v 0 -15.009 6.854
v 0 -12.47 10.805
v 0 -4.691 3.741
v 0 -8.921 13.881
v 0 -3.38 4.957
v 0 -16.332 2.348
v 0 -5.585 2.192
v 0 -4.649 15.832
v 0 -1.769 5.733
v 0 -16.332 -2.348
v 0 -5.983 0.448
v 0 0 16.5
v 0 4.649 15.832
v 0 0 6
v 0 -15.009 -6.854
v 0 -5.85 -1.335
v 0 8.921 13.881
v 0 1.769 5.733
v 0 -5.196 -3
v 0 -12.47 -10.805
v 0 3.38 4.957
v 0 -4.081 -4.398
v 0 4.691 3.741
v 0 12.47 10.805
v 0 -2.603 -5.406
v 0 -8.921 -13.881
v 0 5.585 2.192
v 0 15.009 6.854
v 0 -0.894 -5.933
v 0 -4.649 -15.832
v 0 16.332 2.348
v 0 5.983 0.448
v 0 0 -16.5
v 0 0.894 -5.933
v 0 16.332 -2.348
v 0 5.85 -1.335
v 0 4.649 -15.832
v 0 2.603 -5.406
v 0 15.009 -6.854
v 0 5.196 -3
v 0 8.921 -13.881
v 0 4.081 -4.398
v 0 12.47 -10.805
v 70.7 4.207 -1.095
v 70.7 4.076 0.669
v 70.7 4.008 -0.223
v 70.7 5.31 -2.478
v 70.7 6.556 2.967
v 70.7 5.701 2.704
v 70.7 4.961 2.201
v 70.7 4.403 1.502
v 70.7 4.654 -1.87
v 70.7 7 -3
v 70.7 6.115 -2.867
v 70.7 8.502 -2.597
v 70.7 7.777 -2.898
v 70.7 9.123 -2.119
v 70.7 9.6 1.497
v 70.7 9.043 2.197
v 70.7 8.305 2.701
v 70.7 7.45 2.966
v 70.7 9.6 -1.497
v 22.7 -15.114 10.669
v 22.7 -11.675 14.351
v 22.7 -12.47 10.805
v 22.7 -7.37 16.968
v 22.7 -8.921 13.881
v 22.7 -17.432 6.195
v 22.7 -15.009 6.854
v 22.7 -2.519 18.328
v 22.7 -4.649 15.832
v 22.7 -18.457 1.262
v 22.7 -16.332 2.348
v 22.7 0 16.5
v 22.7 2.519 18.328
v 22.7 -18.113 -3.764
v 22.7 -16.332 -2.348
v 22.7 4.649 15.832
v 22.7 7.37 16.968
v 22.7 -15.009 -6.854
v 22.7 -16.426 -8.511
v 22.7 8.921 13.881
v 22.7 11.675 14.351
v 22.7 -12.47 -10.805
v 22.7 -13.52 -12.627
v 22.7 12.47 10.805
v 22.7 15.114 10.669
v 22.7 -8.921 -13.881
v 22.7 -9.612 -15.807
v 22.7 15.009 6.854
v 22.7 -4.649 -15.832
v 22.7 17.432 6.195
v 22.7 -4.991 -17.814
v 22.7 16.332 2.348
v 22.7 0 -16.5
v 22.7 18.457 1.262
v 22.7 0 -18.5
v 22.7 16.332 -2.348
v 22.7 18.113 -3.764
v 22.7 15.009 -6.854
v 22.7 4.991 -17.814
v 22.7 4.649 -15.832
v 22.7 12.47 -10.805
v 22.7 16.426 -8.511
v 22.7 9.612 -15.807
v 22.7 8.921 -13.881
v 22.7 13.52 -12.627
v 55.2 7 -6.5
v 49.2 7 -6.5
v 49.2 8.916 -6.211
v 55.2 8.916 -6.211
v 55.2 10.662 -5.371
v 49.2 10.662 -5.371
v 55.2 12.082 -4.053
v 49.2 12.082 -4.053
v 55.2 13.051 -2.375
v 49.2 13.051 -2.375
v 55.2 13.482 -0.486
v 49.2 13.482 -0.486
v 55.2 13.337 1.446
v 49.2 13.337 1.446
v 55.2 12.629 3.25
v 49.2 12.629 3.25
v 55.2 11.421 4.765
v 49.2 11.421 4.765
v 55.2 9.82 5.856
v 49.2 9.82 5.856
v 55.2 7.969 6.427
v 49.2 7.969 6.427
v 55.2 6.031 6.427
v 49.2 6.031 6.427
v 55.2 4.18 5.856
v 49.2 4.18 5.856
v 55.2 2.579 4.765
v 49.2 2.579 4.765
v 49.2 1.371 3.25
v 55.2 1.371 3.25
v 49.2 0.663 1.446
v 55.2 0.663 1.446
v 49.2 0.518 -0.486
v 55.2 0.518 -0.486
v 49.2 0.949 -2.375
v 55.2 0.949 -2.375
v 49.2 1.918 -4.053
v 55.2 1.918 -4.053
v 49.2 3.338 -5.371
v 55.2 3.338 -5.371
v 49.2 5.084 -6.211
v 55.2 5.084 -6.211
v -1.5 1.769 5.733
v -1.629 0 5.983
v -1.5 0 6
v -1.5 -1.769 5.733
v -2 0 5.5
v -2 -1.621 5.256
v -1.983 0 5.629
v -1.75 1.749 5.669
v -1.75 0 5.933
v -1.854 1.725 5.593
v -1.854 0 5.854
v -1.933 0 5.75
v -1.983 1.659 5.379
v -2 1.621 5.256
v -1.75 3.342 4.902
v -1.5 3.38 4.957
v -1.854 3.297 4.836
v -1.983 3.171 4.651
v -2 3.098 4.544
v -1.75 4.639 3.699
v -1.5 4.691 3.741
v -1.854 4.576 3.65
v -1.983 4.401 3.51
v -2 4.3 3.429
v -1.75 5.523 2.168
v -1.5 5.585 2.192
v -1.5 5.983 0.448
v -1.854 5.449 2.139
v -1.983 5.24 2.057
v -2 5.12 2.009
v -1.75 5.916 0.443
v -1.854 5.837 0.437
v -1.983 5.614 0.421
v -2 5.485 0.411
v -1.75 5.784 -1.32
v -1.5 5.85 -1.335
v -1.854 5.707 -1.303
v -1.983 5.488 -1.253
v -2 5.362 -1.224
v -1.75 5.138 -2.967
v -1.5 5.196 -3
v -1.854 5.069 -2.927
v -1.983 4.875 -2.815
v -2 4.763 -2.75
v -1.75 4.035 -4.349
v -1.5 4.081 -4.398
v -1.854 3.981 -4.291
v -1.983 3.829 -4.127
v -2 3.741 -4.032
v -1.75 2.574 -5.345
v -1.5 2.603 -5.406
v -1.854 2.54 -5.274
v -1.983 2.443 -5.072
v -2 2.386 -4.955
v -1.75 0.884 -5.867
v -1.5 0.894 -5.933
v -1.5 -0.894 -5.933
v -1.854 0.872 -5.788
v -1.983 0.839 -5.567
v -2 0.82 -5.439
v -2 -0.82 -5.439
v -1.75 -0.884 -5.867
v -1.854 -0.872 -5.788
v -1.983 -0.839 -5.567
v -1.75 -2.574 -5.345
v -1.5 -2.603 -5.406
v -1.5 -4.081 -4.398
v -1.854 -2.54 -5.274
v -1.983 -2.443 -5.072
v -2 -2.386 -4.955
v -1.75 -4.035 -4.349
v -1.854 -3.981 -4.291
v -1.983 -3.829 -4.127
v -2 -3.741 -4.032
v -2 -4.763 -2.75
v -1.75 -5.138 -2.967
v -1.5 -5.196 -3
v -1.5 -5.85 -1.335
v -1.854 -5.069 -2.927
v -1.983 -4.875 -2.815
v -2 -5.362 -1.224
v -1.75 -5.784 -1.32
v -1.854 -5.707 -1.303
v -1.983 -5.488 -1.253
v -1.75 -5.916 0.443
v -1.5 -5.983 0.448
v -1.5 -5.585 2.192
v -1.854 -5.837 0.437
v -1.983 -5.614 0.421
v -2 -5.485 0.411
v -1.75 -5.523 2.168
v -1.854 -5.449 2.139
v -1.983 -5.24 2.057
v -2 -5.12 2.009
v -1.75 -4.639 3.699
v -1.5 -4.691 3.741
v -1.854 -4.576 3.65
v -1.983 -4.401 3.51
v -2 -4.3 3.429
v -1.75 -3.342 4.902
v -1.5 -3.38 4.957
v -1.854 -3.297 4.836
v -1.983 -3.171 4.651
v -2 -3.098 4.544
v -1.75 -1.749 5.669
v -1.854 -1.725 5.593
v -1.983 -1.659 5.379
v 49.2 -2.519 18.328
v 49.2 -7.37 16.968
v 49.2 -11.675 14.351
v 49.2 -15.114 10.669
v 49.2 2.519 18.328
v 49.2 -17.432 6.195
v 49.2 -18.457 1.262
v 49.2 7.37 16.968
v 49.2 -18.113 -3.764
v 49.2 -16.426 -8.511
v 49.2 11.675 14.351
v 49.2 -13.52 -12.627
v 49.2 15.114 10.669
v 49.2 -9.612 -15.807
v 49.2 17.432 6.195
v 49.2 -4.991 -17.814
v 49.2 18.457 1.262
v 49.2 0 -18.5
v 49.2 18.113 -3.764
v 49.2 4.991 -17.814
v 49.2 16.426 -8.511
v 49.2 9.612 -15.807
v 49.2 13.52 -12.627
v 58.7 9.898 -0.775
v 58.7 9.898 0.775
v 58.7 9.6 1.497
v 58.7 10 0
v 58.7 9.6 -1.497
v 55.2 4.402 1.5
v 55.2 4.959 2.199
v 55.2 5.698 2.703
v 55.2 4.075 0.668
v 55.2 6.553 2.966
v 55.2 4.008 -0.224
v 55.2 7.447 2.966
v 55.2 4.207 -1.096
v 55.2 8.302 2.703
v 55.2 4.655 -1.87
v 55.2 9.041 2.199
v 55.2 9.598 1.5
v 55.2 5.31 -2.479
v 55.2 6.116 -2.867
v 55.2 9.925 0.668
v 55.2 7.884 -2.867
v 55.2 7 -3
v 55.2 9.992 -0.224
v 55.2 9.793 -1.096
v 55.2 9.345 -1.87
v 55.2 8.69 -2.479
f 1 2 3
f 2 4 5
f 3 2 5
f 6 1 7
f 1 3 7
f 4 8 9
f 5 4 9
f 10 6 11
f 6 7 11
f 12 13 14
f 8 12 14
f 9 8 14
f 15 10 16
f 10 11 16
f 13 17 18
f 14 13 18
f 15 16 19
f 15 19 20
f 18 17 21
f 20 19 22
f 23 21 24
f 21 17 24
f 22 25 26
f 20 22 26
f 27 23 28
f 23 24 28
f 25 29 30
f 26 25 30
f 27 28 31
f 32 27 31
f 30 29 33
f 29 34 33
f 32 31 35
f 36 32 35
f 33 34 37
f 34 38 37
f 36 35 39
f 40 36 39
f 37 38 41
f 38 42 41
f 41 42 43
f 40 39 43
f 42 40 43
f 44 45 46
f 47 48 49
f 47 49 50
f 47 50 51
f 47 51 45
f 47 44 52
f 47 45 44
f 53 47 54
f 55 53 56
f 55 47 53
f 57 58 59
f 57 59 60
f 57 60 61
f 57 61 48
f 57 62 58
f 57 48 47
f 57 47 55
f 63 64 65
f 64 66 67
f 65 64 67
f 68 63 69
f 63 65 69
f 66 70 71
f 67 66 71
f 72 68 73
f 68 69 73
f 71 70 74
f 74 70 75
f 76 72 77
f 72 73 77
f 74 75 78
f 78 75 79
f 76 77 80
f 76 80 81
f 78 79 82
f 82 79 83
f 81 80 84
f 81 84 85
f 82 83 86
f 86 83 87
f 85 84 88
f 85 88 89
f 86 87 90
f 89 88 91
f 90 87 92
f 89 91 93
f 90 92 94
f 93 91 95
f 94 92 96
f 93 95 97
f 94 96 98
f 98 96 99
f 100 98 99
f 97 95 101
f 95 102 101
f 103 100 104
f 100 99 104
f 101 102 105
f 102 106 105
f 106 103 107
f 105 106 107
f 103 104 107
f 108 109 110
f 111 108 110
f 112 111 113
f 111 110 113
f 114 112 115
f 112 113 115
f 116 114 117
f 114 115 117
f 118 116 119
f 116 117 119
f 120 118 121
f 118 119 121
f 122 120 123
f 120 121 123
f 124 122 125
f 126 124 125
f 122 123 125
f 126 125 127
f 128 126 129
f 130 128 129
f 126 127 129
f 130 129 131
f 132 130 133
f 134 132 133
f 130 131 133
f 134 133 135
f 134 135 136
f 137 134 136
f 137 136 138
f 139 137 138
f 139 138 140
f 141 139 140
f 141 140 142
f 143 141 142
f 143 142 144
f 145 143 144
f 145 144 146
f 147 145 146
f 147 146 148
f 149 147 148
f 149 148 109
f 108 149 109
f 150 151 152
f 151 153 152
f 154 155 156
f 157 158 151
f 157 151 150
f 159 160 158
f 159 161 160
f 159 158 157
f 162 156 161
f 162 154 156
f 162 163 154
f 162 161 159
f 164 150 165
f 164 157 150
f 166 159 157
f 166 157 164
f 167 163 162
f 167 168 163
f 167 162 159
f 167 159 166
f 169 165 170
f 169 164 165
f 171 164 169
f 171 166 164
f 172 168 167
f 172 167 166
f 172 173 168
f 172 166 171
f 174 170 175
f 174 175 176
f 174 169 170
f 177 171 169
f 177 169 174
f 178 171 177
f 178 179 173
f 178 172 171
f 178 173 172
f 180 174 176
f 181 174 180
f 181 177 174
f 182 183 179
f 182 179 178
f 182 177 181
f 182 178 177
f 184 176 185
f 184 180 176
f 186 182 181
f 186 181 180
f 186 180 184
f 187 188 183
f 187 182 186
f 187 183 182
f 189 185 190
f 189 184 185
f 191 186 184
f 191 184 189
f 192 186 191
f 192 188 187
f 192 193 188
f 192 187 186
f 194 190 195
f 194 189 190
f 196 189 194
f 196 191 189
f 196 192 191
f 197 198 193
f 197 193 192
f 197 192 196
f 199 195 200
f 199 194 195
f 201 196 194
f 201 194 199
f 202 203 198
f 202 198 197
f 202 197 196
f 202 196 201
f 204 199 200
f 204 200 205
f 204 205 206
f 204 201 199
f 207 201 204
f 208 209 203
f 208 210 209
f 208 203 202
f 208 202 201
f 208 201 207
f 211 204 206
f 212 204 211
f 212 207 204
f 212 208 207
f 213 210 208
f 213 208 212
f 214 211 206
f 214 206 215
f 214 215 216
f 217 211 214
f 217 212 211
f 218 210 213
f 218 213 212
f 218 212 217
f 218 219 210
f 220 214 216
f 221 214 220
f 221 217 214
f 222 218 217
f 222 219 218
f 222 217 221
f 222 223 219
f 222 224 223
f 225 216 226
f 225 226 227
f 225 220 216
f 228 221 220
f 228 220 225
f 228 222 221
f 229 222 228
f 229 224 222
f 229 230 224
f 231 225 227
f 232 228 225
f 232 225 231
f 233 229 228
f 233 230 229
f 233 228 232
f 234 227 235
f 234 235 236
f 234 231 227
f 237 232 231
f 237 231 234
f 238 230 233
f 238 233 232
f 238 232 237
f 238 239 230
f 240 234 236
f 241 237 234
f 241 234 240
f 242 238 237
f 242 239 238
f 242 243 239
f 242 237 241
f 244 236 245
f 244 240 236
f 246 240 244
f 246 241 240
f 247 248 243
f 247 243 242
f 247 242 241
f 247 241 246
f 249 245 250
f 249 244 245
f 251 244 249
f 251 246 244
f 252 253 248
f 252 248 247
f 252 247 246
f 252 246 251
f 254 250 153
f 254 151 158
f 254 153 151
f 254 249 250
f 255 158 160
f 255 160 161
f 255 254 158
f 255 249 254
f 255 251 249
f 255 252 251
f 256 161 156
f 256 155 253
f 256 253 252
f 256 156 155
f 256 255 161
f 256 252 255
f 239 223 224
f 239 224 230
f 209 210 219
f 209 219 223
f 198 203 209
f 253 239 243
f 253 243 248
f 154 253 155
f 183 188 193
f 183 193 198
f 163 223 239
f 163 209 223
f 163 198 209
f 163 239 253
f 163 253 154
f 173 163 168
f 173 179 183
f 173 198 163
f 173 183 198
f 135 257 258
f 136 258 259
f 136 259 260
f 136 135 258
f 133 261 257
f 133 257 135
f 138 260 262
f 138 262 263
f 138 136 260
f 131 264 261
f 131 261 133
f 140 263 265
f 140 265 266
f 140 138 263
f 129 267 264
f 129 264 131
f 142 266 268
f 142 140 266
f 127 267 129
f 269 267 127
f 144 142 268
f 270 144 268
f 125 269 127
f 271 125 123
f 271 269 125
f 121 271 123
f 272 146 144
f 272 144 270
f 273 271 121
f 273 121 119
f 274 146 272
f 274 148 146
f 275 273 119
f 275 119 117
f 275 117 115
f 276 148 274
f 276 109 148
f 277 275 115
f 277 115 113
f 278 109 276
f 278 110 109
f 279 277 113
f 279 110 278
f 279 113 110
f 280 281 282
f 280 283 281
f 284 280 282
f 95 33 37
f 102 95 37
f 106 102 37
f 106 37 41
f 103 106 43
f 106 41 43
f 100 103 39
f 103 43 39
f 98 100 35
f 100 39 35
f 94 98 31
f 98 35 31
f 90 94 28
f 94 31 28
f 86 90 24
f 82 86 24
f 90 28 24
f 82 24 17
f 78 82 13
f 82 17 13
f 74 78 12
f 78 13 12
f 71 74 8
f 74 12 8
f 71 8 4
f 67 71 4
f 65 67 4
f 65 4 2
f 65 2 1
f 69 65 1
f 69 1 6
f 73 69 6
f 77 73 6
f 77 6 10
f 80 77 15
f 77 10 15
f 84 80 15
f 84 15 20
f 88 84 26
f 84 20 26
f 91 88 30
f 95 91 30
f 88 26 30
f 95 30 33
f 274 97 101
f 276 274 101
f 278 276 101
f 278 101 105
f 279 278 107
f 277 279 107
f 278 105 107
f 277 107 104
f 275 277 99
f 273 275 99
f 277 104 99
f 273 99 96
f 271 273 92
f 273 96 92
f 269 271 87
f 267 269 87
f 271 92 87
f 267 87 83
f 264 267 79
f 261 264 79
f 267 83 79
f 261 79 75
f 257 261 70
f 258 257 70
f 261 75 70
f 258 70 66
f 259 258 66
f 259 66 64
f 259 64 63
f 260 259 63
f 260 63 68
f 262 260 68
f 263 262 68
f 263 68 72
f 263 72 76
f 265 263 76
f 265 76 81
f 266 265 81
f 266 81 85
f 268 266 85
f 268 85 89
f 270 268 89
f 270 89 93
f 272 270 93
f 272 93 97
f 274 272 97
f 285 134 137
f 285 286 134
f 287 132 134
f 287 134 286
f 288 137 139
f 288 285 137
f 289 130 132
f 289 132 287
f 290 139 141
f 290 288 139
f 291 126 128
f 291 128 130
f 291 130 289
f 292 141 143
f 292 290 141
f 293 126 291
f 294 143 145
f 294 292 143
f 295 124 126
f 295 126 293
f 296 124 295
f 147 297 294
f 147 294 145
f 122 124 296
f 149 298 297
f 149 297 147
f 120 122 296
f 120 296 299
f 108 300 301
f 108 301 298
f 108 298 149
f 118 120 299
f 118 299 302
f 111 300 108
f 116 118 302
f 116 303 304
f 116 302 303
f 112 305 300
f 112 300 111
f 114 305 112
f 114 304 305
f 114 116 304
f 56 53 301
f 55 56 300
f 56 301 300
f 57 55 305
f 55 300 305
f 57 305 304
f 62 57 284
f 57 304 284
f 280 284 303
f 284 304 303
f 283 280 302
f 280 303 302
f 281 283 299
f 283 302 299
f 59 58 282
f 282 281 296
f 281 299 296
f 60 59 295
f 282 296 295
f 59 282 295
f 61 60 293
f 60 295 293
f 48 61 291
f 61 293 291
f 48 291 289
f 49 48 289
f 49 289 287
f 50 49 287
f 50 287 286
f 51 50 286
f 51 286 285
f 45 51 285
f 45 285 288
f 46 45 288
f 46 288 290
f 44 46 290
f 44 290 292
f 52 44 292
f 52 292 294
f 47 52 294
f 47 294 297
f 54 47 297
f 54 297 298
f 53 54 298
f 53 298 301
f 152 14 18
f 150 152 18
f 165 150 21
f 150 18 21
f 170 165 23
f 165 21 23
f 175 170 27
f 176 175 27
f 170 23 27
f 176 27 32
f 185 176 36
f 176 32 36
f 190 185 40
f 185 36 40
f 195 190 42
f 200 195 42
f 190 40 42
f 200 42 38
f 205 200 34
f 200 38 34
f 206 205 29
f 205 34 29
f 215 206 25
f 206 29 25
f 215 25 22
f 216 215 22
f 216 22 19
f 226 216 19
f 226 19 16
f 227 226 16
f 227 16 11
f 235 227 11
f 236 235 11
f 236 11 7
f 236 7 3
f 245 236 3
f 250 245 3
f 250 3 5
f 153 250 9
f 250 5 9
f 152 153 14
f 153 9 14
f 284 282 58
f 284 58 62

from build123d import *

# Parameters (mm, degrees)
SKETCH_1_R               = 16.5
EXTRUDE_1_DEPTH          = 22.7
SKETCH_2_R               = 18.5
EXTRUDE_2_DEPTH          = 24
SKETCH_3_R               = 6.5
EXTRUDE_3_DEPTH          = 8.5
SKETCH_5_R               = 1.5
CUT_EXTRUDE_2_DEPTH      = 10
SKETCH_2_2_R             = 18.5
EXTRUDE_4_DEPTH          = 26.5
SKETCH_3_2_R             = 6.5
EXTRUDE_5_DEPTH          = 6
SKETCH_9_R               = 3
EXTRUDE_6_DEPTH          = 15.5
CUT_EXTRUDE_3_DEPTH      = 76.385608706
CUT_EXTRUDE_3_DEPTH_BACK = 12
SKETCH_11_R              = 6
EXTRUDE_7_DEPTH          = 2
FILLET_1_R               = 0.5


with BuildPart() as part:
    # 草图1 → 凸台-拉伸1 (new body)
    with BuildSketch(Plane(origin=(0, 0, 0), x_dir=(0, 0, -1), z_dir=(1, 0, 0))):
        Circle(SKETCH_1_R)
    extrude(amount=EXTRUDE_1_DEPTH)

    # 草图2 → 凸台-拉伸2 (add)
    with BuildSketch(Plane(origin=(22.7, 0, 0), x_dir=(0, 0, -1), z_dir=(1, 0, 0))):
        Circle(SKETCH_2_R)
    extrude(amount=EXTRUDE_2_DEPTH)

    # 草图3 → 凸台-拉伸3 (add)
    with BuildSketch(Plane(origin=(46.7, 0, 0), x_dir=(0, 0, -1), z_dir=(1, 0, 0))):
        with Locations((0, 7)):
            Circle(SKETCH_3_R)
    extrude(amount=EXTRUDE_3_DEPTH)

    # 草图5 → 切除-拉伸2 (cut)
    with BuildSketch(Plane(origin=(46.7, 0, 0), x_dir=(0, 0, -1), z_dir=(1, 0, 0))):
        with Locations((-15.5, 0)):
            Circle(SKETCH_5_R)
        with Locations((-7.75, 13.423393759)):
            Circle(SKETCH_5_R)
        with Locations((7.75, 13.423393759)):
            Circle(SKETCH_5_R)
        with Locations((15.5, 0)):
            Circle(SKETCH_5_R)
        with Locations((7.75, -13.423393759)):
            Circle(SKETCH_5_R)
        with Locations((-7.75, -13.423393759)):
            Circle(SKETCH_5_R)
    extrude(amount=-CUT_EXTRUDE_2_DEPTH, mode=Mode.SUBTRACT)

    # 草图2<2> → 凸台-拉伸4 (add)
    with BuildSketch(Plane(origin=(22.7, 0, 0), x_dir=(0, 0, -1), z_dir=(1, 0, 0))):
        Circle(SKETCH_2_2_R)
    extrude(amount=EXTRUDE_4_DEPTH)

    # 草图3<2> → 凸台-拉伸5 (add)
    with BuildSketch(Plane(origin=(46.7, 0, 0), x_dir=(0, 0, -1), z_dir=(1, 0, 0))):
        with Locations((0, 7)):
            Circle(SKETCH_3_2_R)
    extrude(amount=EXTRUDE_5_DEPTH)

    # 草图9 → 凸台-拉伸6 (add)
    with BuildSketch(Plane(origin=(55.2, 0, 0), x_dir=(0, 0, -1), z_dir=(1, 0, 0))):
        with Locations((0, 7)):
            Circle(SKETCH_9_R)
    extrude(amount=EXTRUDE_6_DEPTH)

    # 草图10 → 切除-拉伸3 (cut, two sides: drawn at the far end of the back side and taken through both)
    with BuildSketch(Plane(origin=(70.7, 0, 0), x_dir=(0, 0, -1), z_dir=(1, 0, 0)).offset(-CUT_EXTRUDE_3_DEPTH_BACK)):
        Polygon((-80.474239871, 9.6), (-1.496662955, 9.6), (1.496662955, 9.6), (80.474239871, 9.6), (80.474239871, 167.555153833), (-80.474239871, 167.555153833), align=None)
    extrude(amount=CUT_EXTRUDE_3_DEPTH + CUT_EXTRUDE_3_DEPTH_BACK, mode=Mode.SUBTRACT)

    # 草图11 → 凸台-拉伸7 (add)
    with BuildSketch(Plane.ZY):
        Circle(SKETCH_11_R)
    extrude(amount=EXTRUDE_7_DEPTH)

    # 圆角1
    fillet_1_edges = [part.edges().sort_by_distance(p)[0] for p in [
        (-2, 0, -6),
    ]]
    fillet(fillet_1_edges, radius=FILLET_1_R)


solid = part.part
